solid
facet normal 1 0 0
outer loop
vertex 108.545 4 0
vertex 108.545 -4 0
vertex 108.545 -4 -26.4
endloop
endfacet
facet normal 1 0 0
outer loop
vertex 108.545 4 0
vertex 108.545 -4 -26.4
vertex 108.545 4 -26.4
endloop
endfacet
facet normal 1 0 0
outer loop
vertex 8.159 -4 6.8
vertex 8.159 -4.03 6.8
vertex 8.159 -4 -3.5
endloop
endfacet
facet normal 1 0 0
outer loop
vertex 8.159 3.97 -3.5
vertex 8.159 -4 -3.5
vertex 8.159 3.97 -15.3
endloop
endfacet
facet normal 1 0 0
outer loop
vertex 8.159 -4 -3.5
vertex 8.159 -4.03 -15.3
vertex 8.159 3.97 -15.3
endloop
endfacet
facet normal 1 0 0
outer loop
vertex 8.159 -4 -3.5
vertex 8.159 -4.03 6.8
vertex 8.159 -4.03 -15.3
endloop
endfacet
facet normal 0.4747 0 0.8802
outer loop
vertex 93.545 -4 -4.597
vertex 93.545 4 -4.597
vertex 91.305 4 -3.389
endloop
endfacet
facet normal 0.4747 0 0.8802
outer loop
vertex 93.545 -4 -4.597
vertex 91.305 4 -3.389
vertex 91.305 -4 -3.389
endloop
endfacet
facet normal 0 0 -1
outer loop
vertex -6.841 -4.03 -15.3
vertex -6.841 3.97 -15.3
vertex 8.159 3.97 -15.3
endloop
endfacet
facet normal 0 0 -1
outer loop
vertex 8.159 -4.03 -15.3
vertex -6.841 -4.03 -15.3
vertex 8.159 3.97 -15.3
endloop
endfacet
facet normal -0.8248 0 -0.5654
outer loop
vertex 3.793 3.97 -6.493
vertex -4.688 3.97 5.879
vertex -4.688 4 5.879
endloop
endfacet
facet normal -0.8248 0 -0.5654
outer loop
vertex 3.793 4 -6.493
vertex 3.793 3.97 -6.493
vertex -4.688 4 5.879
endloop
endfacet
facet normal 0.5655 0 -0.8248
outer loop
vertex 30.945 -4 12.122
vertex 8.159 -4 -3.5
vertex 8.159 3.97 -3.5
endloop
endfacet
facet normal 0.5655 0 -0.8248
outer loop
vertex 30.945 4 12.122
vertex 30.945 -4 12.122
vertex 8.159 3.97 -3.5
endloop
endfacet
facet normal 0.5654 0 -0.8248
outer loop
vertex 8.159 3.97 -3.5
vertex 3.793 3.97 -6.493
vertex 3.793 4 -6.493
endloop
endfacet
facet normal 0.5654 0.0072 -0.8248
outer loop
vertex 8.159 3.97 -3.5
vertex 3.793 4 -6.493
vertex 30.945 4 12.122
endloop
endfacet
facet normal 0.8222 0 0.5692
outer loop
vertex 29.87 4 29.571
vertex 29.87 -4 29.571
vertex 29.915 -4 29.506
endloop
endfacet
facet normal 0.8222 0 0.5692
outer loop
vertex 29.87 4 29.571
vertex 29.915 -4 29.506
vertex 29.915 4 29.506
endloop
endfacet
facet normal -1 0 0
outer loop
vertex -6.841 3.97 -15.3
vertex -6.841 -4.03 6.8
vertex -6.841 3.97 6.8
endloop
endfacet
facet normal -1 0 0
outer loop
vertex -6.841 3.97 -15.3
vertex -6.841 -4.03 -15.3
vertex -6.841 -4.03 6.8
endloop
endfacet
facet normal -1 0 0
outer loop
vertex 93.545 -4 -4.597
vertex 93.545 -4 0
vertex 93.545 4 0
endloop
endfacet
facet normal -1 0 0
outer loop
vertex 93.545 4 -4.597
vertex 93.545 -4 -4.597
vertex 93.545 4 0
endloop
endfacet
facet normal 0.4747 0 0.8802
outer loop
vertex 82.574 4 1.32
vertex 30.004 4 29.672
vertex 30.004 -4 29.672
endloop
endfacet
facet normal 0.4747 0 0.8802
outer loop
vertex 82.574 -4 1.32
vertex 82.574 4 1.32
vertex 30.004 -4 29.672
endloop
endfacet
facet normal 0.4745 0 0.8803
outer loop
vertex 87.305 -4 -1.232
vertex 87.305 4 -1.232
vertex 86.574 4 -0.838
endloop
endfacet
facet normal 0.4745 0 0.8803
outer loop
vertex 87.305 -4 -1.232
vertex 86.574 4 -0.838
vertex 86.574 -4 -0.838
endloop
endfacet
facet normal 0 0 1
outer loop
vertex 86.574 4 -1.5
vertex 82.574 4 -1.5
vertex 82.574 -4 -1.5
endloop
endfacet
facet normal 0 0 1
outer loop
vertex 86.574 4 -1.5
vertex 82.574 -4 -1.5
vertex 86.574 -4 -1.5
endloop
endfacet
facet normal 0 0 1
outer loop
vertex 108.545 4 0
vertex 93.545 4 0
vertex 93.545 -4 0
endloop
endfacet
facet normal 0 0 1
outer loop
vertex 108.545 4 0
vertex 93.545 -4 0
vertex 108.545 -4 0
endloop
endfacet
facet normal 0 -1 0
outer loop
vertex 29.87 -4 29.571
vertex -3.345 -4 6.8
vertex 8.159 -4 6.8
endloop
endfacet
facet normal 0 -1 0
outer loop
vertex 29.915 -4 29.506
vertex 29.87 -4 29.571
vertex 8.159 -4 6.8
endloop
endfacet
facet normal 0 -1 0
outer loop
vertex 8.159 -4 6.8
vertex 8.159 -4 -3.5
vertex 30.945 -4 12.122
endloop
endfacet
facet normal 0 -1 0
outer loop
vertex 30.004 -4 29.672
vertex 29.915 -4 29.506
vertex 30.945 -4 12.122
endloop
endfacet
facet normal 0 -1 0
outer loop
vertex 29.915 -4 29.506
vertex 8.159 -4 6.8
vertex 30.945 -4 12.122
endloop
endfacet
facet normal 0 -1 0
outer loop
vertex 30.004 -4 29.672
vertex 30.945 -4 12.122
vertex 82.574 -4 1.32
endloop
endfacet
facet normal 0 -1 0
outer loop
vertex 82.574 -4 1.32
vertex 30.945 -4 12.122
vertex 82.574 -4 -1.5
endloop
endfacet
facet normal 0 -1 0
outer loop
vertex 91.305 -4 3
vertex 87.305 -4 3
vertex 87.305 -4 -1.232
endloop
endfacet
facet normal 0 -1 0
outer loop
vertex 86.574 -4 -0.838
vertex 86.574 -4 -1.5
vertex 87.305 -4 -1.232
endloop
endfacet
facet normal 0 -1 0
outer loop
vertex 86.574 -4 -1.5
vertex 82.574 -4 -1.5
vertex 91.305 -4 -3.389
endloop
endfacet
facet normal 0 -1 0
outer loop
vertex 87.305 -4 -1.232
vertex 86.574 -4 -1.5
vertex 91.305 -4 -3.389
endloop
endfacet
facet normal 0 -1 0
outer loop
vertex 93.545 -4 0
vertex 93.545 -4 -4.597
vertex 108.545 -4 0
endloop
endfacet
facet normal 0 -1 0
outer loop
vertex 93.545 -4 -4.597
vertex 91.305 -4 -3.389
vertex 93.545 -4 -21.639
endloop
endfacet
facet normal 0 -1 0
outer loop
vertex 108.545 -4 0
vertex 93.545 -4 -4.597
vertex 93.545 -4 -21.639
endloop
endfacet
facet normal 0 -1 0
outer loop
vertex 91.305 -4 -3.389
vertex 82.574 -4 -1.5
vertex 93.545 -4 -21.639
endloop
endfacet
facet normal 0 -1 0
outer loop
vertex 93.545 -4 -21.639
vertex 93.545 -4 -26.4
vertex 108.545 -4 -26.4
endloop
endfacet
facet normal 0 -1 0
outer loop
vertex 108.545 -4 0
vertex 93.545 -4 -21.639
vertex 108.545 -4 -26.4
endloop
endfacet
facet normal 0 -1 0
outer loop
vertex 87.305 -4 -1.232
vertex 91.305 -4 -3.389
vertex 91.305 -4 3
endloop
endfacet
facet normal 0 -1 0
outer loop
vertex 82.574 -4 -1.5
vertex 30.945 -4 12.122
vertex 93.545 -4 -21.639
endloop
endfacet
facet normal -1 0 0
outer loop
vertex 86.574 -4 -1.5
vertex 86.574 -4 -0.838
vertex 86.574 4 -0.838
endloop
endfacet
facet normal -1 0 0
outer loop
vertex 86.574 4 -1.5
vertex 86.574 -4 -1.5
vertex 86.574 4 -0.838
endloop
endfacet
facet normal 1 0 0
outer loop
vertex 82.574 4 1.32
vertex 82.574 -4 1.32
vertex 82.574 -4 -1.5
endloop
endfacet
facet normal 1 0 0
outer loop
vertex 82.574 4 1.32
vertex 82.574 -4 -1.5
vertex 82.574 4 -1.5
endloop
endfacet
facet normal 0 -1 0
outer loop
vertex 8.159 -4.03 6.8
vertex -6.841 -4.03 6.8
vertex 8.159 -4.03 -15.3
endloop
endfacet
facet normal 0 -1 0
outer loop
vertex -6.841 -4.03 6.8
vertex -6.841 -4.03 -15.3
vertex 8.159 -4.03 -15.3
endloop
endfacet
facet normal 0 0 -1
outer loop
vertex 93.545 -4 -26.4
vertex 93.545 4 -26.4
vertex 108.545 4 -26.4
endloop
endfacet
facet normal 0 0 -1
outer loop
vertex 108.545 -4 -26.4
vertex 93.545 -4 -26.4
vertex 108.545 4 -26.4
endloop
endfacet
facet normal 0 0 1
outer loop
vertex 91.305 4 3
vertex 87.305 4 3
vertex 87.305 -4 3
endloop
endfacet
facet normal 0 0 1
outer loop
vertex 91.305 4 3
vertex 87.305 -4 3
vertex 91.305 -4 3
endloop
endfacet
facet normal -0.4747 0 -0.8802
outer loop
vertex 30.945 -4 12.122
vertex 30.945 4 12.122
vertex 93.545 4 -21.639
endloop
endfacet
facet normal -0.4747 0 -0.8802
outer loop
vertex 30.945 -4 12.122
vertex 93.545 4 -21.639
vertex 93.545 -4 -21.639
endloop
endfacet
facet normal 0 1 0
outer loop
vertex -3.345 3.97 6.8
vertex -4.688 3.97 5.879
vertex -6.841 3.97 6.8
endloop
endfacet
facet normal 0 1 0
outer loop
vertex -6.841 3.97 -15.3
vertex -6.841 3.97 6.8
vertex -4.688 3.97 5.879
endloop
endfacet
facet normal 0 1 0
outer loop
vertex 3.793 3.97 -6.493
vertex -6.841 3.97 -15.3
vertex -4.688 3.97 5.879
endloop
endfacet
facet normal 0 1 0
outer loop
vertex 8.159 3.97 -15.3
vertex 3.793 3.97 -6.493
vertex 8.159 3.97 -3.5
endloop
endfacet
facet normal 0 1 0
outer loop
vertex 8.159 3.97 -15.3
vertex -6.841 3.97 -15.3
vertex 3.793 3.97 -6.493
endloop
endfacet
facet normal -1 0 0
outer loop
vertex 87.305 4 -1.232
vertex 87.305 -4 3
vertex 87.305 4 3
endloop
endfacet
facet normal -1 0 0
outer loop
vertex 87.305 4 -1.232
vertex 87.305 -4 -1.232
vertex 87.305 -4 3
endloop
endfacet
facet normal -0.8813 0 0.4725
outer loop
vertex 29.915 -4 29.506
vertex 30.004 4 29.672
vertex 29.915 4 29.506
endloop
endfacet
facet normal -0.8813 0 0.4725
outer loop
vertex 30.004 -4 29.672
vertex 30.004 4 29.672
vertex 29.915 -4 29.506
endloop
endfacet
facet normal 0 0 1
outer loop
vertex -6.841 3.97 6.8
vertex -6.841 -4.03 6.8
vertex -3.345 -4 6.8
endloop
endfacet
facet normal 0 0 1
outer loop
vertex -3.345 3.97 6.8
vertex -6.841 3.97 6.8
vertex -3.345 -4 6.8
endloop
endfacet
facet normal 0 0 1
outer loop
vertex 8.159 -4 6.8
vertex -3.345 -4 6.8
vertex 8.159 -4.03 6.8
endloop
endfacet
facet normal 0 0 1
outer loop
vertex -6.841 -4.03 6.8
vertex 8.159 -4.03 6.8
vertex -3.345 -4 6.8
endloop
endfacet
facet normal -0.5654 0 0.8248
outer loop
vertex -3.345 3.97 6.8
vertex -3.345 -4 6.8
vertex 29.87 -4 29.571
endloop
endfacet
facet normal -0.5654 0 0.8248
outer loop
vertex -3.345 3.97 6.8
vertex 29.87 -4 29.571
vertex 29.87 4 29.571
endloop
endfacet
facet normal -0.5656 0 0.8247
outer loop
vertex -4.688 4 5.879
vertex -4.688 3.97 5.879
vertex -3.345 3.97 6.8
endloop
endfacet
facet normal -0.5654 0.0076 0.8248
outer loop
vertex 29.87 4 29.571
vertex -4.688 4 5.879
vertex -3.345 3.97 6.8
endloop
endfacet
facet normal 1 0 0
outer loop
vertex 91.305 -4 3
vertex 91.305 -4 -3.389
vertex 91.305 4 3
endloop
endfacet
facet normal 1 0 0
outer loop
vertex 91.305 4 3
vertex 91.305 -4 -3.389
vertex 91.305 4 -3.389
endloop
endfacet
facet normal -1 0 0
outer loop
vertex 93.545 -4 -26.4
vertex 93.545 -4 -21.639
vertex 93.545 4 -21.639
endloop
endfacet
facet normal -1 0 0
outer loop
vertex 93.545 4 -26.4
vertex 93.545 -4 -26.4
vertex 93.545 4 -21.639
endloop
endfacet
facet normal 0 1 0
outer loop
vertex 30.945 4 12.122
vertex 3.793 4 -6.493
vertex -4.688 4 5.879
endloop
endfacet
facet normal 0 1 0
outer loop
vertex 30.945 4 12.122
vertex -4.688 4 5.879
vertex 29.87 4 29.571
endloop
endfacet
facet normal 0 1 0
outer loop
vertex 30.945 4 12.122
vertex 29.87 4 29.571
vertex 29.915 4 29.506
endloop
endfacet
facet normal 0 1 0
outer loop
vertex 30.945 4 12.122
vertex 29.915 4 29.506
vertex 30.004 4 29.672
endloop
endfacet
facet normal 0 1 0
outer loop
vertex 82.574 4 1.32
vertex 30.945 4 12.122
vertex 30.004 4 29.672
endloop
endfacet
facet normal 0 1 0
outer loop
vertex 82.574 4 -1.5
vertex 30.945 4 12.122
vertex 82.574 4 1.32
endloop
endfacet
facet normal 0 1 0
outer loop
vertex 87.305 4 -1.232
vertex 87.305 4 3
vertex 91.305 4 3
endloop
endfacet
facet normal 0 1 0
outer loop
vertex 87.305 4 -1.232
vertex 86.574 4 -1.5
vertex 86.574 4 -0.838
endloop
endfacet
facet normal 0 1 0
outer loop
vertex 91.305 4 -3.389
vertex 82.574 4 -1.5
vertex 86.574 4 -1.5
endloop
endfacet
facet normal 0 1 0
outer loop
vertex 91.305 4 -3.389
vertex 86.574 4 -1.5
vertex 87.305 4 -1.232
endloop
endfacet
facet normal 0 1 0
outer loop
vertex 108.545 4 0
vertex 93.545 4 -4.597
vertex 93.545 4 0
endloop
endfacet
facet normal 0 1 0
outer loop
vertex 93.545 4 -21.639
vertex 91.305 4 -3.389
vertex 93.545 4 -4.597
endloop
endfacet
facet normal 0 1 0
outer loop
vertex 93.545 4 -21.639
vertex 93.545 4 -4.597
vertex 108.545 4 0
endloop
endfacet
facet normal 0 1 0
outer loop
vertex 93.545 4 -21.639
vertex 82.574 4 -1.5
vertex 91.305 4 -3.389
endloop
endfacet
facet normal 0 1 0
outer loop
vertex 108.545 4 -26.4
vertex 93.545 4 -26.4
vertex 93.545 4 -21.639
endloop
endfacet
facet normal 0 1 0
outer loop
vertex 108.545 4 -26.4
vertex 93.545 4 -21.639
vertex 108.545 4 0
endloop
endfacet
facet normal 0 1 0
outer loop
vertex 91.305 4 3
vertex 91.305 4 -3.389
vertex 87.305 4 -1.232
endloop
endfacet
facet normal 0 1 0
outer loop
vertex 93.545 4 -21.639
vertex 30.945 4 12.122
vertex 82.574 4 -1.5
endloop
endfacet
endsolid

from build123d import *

# Parameters (mm, degrees)
F4_W      = 8
F4_H      = 15
F5_DEPTH  = 41.9
F6_W      = 8
F6_H      = 15
F7_DEPTH  = 84.2
F8_DEPTH  = 4.9
F9_W      = 15
F9_H      = 8
F10_DEPTH = 15.3
F11_DEPTH = 6.8
F12_W     = 15
F12_H     = 8
F13_DEPTH = 26.4
F14_W     = 4
F14_H     = 8
F15_DEPTH = 1.5
F16_W     = 4
F16_H     = 8
F17_DEPTH = 5
F18_DEPTH = 3


with BuildPart() as f5:
    # F4 (on face) → F5 (new body)
    with BuildSketch(Plane(origin=(-0.447452, 0, -0.306762), x_dir=(0, 1, 0), z_dir=(0.824783, 0, 0.56545))):
        Rectangle(F4_W, F4_H)
    extrude(amount=F5_DEPTH)

    # F6 (on face) → F7 (join)
    with BuildSketch(Plane(origin=(15.159437, 0, -8.175749), x_dir=(0, -1, 0), z_dir=(-0.880156, 0, 0.474684))):
        with Locations((0, 32.858156)):
            Rectangle(F6_W, F6_H)
    extrude(amount=-F7_DEPTH)

    # F6 (on face) → F8 (join)
    with BuildSketch(Plane(origin=(15.159437, 0, -8.175749), x_dir=(0, -1, 0), z_dir=(-0.880156, 0, 0.474684))):
        with Locations((0, 32.858156)):
            Rectangle(F6_W, F6_H)
    extrude(amount=F8_DEPTH)

    # F9 (on Top) → F10 (join)
    with BuildSketch(Plane.XY):
        with Locations((0.658734, -0.029655)):
            Rectangle(F9_W, F9_H)
    extrude(amount=-F10_DEPTH)

    # F9 (on Top) → F11 (join)
    with BuildSketch(Plane.XY):
        with Locations((0.658734, -0.029655)):
            Rectangle(F9_W, F9_H)
    extrude(amount=F11_DEPTH)

    # F12 (on Top) → F13 (join)
    with BuildSketch(Plane.XY):
        with Locations((101.044647, 0)):
            Rectangle(F12_W, F12_H)
    extrude(amount=-F13_DEPTH)

    # F14 (on Top) → F15 (cut, symmetric)
    with BuildSketch(Plane.XY):
        with Locations((84.574081, 0)):
            Rectangle(F14_W, F14_H)
    extrude(amount=F15_DEPTH, both=True, mode=Mode.SUBTRACT)

    # F16 (on Top) → F17 (join)
    with BuildSketch(Plane.XY):
        with Locations((89.305073, 0)):
            Rectangle(F16_W, F16_H)
    extrude(amount=-F17_DEPTH)

    # F16 (on Top) → F18 (join)
    with BuildSketch(Plane.XY):
        with Locations((89.305073, 0)):
            Rectangle(F16_W, F16_H)
    extrude(amount=F18_DEPTH)


solid = f5.part
